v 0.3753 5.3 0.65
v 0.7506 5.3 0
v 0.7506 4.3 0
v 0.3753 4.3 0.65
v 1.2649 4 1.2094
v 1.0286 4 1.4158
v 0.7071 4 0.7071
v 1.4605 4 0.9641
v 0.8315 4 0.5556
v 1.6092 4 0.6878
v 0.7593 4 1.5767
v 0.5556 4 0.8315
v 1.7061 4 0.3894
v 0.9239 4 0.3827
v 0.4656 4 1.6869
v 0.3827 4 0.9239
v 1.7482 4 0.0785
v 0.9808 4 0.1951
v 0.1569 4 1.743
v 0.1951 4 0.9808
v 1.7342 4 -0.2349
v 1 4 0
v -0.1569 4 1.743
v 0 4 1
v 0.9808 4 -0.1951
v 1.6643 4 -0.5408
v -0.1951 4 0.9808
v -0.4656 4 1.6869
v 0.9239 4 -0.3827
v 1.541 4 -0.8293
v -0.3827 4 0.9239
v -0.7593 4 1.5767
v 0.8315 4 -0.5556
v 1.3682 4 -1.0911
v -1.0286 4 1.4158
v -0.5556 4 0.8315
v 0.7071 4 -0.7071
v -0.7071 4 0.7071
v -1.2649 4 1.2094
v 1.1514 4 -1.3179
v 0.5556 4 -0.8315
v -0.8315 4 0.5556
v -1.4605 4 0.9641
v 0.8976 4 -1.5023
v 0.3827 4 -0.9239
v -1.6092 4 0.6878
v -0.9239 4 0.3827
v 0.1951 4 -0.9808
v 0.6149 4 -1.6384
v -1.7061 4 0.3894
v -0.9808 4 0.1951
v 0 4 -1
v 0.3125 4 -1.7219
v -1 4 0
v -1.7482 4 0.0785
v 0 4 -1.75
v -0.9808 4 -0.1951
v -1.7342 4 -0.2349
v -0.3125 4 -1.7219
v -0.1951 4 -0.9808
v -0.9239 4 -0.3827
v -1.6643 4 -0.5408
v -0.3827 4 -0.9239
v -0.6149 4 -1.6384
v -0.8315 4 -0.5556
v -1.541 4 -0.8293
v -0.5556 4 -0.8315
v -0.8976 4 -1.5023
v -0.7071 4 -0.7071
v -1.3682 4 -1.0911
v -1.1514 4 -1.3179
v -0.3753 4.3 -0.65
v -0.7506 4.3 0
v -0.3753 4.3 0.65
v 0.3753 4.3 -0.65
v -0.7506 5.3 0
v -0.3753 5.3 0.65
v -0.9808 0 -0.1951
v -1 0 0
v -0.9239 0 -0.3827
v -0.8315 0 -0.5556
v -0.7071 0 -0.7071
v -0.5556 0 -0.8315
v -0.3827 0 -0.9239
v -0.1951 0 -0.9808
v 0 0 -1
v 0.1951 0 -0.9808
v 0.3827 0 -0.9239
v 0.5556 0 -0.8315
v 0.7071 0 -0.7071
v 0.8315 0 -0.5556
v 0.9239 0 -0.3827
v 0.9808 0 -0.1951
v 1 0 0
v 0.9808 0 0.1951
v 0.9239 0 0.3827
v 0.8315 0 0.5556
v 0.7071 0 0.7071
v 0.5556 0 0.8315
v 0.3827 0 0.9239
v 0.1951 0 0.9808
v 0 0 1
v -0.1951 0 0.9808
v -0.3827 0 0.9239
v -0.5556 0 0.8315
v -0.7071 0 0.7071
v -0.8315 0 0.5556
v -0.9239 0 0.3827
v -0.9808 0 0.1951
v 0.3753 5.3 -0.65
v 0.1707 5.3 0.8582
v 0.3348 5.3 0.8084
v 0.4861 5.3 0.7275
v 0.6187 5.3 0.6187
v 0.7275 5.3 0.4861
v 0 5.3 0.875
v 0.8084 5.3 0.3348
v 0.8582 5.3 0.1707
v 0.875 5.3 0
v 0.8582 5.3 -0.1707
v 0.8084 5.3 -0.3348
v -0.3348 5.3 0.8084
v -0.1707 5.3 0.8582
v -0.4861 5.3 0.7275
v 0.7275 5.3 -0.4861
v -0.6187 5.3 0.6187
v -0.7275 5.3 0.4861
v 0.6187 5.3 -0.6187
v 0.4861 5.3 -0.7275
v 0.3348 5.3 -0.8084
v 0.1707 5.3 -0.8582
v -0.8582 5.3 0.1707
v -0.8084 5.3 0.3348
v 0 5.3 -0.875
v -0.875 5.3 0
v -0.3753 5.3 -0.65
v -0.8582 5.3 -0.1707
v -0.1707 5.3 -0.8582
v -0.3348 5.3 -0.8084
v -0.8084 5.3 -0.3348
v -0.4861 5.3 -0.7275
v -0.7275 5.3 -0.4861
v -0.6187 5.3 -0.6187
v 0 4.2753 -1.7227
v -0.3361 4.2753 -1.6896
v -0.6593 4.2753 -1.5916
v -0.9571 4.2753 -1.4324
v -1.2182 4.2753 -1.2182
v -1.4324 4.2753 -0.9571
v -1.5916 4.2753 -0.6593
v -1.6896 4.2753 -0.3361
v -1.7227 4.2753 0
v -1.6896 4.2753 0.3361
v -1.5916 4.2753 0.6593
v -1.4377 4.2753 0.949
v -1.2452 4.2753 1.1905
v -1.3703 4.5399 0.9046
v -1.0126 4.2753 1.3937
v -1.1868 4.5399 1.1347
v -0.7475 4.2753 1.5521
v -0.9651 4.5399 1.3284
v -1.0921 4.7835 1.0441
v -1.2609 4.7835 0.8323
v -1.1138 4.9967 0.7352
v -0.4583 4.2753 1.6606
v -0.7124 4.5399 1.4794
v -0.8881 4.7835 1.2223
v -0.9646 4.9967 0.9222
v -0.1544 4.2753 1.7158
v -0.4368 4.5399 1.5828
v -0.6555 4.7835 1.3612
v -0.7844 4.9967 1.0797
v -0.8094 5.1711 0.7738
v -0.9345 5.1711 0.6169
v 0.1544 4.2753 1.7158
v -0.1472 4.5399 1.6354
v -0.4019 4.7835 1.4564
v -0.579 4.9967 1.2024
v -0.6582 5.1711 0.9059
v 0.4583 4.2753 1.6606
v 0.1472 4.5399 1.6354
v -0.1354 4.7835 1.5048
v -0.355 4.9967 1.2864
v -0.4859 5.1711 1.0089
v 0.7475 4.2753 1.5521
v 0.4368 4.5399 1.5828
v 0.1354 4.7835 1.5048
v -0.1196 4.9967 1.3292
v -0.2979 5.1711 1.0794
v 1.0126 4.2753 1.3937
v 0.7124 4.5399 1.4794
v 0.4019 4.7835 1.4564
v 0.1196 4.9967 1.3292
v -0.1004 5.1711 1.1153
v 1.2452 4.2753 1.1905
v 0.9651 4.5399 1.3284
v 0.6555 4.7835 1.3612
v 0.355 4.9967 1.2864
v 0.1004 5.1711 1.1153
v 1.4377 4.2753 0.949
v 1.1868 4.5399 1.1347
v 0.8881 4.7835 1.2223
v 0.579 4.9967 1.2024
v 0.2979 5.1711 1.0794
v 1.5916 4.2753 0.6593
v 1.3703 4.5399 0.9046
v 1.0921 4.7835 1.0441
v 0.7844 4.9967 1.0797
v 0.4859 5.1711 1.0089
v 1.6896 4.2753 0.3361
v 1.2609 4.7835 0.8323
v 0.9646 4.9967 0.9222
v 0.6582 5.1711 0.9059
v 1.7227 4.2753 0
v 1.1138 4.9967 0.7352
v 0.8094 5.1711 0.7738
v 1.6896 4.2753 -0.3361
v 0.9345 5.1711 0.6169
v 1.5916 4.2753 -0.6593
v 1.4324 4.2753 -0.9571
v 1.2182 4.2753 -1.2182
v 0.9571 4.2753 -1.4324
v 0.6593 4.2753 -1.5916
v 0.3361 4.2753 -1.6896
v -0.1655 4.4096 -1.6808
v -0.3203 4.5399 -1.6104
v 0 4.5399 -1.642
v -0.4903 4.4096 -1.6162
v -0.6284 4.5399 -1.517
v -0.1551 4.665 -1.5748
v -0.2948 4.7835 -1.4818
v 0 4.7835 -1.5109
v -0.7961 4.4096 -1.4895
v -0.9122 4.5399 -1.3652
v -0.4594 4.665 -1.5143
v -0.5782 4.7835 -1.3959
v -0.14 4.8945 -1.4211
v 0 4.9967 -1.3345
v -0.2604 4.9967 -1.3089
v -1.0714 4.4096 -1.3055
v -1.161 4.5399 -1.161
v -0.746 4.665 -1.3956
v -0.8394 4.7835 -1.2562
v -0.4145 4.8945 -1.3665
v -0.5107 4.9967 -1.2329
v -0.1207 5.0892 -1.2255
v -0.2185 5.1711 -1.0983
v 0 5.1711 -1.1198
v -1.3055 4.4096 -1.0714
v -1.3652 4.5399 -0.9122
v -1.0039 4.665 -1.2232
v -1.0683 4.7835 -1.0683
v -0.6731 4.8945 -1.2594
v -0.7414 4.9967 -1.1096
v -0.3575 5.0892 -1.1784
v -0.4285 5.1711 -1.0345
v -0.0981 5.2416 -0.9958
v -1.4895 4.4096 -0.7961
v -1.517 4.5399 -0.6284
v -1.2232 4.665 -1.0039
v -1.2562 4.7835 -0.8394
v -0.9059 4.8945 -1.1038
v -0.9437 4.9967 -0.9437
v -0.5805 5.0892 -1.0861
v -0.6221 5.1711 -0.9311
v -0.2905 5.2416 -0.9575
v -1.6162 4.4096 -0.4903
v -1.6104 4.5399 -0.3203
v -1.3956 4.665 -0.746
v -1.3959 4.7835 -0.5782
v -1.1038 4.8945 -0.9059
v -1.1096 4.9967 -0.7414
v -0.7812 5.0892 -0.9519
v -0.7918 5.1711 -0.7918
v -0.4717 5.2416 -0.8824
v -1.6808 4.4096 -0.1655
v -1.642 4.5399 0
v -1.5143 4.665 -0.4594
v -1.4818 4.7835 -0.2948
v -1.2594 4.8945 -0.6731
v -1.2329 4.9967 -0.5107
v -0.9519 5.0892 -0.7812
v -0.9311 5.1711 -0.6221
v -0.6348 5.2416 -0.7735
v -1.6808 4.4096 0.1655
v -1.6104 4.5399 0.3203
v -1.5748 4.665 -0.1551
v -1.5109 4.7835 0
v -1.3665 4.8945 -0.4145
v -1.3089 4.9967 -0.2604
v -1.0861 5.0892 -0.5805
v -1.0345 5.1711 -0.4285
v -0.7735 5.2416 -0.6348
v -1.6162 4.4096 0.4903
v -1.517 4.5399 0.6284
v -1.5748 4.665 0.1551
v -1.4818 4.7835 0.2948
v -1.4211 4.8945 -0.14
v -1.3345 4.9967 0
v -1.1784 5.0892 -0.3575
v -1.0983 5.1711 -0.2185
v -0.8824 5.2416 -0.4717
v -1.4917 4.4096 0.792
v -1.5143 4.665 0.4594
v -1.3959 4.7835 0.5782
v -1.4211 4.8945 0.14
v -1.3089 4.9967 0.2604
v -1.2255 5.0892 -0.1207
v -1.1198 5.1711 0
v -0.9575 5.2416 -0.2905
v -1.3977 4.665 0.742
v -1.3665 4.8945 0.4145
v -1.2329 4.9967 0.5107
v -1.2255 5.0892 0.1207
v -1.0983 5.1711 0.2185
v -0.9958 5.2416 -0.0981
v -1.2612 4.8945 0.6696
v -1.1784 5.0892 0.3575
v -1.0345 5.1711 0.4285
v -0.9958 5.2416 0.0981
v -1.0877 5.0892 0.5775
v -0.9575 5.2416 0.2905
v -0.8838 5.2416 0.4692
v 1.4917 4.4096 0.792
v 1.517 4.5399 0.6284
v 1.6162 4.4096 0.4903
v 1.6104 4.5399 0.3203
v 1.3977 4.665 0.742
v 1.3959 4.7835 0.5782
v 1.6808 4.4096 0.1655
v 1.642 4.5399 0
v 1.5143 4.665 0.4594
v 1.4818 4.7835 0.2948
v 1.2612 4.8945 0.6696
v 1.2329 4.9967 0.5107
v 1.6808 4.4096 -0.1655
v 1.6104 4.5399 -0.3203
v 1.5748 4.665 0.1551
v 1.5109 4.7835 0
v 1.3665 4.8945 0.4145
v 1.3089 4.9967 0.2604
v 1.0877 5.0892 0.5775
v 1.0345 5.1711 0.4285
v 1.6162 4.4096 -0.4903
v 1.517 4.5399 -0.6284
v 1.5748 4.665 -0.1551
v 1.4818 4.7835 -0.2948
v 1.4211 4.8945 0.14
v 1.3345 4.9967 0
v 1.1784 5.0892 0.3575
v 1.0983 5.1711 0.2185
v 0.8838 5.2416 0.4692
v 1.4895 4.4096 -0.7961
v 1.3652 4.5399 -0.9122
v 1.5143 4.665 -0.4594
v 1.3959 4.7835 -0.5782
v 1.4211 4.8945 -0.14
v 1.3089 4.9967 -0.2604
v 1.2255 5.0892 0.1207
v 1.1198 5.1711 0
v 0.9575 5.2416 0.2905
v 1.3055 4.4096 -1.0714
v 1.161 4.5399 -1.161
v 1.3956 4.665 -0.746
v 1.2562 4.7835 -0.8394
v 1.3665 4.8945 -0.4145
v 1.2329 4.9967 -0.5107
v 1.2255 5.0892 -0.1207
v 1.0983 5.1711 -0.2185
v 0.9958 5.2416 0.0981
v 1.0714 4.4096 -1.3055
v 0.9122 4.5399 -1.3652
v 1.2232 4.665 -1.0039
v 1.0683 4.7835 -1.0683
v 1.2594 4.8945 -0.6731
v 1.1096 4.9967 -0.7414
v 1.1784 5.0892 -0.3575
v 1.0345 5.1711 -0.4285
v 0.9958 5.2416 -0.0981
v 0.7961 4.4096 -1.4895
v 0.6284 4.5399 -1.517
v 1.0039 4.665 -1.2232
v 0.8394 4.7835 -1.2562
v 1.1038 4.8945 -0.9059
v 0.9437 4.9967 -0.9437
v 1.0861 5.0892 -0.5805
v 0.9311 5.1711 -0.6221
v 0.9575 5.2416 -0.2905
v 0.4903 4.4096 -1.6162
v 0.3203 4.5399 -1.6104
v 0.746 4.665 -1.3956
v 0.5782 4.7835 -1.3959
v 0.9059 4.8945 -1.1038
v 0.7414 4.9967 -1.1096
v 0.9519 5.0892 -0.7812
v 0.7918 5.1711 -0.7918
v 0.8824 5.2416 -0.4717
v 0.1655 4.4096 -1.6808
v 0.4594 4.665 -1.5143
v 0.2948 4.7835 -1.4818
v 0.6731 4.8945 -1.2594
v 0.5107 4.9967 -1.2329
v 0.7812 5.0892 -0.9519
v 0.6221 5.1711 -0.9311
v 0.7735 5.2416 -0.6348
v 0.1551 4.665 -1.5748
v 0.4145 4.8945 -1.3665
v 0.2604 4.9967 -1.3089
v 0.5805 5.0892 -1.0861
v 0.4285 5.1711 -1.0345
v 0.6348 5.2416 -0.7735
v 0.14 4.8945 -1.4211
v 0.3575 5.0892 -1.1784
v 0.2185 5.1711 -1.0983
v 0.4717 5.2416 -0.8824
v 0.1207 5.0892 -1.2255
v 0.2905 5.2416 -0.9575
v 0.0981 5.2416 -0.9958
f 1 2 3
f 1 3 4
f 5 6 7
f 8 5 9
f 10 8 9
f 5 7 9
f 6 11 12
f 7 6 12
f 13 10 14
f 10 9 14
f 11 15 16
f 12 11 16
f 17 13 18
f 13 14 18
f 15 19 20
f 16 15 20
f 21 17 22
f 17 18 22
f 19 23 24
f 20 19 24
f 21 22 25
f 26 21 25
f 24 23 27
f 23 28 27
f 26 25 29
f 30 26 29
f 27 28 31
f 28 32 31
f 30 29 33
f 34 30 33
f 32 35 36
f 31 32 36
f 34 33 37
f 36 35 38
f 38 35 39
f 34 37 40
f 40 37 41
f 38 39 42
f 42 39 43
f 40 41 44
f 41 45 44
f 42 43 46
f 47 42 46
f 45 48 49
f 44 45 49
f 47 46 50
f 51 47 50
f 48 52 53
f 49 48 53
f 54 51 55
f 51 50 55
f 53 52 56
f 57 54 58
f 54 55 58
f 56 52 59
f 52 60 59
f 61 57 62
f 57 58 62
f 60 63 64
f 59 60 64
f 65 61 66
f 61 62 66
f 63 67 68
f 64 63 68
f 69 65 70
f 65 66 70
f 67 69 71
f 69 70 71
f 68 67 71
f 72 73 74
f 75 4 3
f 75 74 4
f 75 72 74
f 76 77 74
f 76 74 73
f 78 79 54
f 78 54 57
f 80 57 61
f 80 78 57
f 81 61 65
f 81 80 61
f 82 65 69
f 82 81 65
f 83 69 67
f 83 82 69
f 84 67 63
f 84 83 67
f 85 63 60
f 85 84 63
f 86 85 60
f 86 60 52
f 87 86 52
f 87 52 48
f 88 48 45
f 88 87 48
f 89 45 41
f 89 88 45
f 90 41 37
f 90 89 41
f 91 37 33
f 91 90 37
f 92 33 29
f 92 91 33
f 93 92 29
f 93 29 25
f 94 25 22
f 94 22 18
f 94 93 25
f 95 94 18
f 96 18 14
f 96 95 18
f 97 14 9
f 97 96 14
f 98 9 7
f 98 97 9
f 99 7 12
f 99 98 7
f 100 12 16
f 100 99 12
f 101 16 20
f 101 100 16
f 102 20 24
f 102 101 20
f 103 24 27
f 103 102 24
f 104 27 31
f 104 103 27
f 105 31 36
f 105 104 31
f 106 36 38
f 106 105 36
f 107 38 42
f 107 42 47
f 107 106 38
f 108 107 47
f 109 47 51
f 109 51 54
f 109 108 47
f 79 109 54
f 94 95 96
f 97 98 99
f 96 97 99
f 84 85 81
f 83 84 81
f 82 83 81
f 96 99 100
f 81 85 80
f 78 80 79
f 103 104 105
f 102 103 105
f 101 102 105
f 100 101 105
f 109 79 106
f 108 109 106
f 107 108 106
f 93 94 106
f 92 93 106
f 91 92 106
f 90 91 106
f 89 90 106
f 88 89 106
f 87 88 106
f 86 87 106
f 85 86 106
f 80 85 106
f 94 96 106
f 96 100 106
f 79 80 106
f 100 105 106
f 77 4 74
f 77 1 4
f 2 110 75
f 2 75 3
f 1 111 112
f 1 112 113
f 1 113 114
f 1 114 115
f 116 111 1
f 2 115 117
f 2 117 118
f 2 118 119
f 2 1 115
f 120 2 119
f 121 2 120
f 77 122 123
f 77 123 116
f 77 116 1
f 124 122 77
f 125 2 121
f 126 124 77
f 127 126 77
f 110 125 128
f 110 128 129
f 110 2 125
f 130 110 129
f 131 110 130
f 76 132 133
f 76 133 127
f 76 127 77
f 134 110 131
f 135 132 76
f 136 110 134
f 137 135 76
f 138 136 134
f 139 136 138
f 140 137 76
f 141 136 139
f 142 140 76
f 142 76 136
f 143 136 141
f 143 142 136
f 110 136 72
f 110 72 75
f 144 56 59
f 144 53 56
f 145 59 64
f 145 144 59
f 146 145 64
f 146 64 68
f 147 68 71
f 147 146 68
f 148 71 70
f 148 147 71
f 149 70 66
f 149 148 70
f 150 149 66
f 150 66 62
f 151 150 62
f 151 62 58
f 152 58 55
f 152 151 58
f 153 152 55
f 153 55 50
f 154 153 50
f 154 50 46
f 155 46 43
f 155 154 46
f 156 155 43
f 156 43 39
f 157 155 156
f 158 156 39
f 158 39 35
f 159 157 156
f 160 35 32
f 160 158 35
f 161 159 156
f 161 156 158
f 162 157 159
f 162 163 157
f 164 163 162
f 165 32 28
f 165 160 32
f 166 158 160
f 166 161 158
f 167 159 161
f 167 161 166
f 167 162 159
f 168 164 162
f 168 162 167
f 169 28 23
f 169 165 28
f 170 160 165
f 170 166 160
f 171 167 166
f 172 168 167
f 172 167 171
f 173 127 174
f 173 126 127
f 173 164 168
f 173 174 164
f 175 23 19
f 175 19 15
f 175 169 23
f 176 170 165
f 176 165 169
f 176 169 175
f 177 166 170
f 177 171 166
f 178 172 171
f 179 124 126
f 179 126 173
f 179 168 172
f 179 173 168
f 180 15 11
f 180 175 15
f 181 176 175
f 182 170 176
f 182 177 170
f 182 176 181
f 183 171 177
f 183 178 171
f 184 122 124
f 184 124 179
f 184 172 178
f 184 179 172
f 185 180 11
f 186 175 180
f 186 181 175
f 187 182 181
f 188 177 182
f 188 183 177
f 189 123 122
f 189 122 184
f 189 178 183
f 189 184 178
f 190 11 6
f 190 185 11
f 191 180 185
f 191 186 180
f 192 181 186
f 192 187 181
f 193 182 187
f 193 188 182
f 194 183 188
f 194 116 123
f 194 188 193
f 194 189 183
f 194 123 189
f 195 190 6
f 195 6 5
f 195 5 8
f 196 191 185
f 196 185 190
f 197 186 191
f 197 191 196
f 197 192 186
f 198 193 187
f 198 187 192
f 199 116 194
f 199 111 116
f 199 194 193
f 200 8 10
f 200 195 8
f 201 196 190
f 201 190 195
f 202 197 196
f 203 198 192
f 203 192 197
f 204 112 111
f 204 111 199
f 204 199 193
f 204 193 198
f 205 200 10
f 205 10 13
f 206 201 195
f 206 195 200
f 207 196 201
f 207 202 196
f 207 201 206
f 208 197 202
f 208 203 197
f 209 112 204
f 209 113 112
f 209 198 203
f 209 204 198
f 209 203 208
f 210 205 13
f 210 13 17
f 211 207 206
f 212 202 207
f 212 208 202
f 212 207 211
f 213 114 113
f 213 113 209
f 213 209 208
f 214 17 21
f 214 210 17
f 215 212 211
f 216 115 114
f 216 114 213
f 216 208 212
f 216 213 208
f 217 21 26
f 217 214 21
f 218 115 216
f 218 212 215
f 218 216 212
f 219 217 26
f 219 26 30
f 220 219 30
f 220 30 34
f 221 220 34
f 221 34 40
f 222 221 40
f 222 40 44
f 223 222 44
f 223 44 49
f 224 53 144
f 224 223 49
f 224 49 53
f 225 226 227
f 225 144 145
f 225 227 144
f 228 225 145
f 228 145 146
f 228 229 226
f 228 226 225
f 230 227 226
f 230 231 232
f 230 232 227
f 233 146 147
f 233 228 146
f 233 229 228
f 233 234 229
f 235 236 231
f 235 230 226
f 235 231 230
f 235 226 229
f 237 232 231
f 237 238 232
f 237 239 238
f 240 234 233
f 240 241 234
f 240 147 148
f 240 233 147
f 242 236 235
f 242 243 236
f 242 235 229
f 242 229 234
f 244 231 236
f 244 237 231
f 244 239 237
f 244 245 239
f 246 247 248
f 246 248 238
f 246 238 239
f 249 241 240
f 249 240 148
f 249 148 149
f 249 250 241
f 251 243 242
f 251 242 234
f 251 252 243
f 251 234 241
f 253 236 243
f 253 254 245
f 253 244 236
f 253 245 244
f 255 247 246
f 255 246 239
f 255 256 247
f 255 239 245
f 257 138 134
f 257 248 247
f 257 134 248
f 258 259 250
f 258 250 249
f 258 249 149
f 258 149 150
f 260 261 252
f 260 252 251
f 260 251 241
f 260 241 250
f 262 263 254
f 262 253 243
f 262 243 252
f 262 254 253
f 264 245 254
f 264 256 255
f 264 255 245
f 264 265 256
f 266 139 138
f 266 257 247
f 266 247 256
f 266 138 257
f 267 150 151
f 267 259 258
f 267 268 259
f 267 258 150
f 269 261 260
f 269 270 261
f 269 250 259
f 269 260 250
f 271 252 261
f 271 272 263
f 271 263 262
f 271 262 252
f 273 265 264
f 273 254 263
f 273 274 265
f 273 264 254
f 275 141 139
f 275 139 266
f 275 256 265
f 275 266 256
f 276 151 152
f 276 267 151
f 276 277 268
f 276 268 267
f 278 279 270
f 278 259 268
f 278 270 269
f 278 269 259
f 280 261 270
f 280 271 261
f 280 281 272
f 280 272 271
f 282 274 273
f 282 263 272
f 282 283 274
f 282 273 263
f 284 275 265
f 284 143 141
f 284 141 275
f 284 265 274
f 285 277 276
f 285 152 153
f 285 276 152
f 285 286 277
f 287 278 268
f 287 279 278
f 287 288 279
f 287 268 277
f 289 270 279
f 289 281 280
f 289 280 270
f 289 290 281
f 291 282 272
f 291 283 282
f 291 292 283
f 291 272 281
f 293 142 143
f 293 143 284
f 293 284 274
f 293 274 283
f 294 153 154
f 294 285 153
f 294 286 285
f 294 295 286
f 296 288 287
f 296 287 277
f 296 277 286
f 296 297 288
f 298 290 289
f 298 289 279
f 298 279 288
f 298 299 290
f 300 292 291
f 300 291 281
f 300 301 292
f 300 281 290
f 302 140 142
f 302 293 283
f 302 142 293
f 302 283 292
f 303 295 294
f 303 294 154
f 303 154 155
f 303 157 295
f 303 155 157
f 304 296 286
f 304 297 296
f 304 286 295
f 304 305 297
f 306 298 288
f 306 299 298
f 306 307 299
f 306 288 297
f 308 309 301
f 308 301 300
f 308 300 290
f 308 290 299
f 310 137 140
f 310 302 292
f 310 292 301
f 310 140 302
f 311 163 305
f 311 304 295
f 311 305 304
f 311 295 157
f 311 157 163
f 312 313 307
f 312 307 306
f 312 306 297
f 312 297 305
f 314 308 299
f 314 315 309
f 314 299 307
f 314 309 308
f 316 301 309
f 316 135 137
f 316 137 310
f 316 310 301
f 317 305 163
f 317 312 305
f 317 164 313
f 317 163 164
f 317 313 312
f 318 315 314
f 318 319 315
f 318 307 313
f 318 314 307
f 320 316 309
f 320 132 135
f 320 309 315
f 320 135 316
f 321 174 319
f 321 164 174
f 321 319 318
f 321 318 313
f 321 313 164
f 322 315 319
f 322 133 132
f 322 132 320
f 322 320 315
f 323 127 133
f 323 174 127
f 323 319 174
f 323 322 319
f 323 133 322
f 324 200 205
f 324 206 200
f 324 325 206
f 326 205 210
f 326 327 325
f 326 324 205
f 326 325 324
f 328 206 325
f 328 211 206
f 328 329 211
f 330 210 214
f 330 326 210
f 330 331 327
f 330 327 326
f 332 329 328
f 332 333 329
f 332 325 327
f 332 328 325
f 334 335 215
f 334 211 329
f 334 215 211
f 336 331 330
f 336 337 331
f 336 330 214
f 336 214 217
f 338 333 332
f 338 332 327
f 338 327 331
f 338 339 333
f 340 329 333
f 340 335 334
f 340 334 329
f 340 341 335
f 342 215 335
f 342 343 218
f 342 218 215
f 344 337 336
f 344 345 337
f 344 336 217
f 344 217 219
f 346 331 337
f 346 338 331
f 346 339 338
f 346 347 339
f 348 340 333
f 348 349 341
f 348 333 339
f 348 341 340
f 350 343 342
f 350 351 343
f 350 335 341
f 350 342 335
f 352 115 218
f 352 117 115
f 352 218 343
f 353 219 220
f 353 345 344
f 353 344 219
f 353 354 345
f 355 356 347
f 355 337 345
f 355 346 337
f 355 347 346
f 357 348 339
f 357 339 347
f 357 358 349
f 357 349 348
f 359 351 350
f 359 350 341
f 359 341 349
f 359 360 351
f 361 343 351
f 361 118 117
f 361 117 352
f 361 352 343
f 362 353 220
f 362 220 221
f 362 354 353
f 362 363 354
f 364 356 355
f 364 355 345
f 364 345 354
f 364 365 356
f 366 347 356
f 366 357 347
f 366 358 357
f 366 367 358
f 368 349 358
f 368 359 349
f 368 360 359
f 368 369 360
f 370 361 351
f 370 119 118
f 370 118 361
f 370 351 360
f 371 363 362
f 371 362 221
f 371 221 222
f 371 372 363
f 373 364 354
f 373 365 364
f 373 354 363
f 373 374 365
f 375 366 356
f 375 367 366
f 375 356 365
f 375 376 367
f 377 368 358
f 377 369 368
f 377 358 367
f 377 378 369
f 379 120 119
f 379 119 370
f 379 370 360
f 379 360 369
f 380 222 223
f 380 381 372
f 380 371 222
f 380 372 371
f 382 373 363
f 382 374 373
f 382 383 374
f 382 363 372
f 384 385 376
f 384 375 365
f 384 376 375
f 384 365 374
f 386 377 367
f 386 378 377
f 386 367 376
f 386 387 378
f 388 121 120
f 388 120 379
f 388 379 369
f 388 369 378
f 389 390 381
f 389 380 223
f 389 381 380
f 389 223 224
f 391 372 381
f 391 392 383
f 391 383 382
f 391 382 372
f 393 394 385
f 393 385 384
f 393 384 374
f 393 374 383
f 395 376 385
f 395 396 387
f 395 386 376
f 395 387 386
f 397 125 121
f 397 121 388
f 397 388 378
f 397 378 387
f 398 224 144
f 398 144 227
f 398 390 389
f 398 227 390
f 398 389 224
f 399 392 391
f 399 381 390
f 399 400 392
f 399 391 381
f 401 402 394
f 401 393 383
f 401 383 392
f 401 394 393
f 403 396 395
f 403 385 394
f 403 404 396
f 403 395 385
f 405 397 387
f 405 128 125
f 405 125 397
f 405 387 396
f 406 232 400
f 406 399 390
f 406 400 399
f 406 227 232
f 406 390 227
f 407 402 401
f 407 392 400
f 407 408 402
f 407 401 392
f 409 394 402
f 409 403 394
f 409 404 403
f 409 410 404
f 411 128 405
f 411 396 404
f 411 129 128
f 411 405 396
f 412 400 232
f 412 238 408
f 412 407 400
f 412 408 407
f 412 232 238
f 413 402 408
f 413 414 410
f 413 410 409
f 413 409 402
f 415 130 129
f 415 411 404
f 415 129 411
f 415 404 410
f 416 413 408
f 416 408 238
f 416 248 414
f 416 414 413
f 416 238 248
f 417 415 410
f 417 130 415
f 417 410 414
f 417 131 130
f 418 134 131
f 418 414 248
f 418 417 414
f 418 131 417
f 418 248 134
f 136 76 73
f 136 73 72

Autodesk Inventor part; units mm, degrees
ref_plane "YZ Plane" through (0, 0, 0) normal (1, 0, 0) x (0, 1, 0)
ref_plane "XZ Plane" through (0, 0, 0) normal (0, 1, 0) x (-1, 0, 0)
ref_plane "XY Plane" through (0, 0, 0) normal (0, 0, 1) x (1, 0, 0)
sketch "Эскиз1" plane through (0, 0, 0) normal (0, 1, 0) x (-1, 0, 0)
  circle A0 centre (0, 0) radius 1
  dimension "d0" = 2
extrude "Выдавливание1" add sketch "Эскиз1" along normal blind 4
sketch "Эскиз2" plane through (0, 0, 0) normal (1, 0, 0) x (0, 1, 0)
  line L0 (4, -1) -> (4, 1) projected
  line L1 (4, 0) -> (5.3, 0)
  line L2 (4, 0) -> (4, -1.75)
  line L3 (5.3, 0) -> (5.3, -1.75)
  line L4 (5.3, -1.75) -> (4, -1.75)
  arc A0 (4, -1.75) -> (5.3, -0.875) centre (4, -0.3468) ccw
  point P0 (0, 0)
  dimension "d3" = 1.3
  dimension "d4" = 1.75
revolve "Вращение1" add sketch "Эскиз2" angle 360 about axis through (0, 4, 0) along (0, 1, 0) contours L0 L1 L3 A0 L2
sketch "Эскиз3" plane through (0, 5.3, 0) normal (0, 1, 0) x (1, 0, 0)
  line L0 (0, 0) -> (0, 0.65)
  line L1 (0.3753, 0.65) -> (0.7506, 0)
  line L2 (0.7506, 0) -> (0.3753, -0.65)
  line L3 (0.3753, -0.65) -> (-0.3753, -0.65)
  line L4 (-0.3753, -0.65) -> (-0.7506, 0)
  line L5 (-0.7506, 0) -> (-0.3753, 0.65)
  line L6 (-0.3753, 0.65) -> (0.3753, 0.65)
  dimension "d6" = 0.65
extrude "Выдавливание2" cut sketch "Эскиз3" against normal blind 1
thread "Резьба1" size "M2x0.4" class "6g" standard "ANSI Metric M Profile" length 19.85
properties part number "M2 6mm HEX"
